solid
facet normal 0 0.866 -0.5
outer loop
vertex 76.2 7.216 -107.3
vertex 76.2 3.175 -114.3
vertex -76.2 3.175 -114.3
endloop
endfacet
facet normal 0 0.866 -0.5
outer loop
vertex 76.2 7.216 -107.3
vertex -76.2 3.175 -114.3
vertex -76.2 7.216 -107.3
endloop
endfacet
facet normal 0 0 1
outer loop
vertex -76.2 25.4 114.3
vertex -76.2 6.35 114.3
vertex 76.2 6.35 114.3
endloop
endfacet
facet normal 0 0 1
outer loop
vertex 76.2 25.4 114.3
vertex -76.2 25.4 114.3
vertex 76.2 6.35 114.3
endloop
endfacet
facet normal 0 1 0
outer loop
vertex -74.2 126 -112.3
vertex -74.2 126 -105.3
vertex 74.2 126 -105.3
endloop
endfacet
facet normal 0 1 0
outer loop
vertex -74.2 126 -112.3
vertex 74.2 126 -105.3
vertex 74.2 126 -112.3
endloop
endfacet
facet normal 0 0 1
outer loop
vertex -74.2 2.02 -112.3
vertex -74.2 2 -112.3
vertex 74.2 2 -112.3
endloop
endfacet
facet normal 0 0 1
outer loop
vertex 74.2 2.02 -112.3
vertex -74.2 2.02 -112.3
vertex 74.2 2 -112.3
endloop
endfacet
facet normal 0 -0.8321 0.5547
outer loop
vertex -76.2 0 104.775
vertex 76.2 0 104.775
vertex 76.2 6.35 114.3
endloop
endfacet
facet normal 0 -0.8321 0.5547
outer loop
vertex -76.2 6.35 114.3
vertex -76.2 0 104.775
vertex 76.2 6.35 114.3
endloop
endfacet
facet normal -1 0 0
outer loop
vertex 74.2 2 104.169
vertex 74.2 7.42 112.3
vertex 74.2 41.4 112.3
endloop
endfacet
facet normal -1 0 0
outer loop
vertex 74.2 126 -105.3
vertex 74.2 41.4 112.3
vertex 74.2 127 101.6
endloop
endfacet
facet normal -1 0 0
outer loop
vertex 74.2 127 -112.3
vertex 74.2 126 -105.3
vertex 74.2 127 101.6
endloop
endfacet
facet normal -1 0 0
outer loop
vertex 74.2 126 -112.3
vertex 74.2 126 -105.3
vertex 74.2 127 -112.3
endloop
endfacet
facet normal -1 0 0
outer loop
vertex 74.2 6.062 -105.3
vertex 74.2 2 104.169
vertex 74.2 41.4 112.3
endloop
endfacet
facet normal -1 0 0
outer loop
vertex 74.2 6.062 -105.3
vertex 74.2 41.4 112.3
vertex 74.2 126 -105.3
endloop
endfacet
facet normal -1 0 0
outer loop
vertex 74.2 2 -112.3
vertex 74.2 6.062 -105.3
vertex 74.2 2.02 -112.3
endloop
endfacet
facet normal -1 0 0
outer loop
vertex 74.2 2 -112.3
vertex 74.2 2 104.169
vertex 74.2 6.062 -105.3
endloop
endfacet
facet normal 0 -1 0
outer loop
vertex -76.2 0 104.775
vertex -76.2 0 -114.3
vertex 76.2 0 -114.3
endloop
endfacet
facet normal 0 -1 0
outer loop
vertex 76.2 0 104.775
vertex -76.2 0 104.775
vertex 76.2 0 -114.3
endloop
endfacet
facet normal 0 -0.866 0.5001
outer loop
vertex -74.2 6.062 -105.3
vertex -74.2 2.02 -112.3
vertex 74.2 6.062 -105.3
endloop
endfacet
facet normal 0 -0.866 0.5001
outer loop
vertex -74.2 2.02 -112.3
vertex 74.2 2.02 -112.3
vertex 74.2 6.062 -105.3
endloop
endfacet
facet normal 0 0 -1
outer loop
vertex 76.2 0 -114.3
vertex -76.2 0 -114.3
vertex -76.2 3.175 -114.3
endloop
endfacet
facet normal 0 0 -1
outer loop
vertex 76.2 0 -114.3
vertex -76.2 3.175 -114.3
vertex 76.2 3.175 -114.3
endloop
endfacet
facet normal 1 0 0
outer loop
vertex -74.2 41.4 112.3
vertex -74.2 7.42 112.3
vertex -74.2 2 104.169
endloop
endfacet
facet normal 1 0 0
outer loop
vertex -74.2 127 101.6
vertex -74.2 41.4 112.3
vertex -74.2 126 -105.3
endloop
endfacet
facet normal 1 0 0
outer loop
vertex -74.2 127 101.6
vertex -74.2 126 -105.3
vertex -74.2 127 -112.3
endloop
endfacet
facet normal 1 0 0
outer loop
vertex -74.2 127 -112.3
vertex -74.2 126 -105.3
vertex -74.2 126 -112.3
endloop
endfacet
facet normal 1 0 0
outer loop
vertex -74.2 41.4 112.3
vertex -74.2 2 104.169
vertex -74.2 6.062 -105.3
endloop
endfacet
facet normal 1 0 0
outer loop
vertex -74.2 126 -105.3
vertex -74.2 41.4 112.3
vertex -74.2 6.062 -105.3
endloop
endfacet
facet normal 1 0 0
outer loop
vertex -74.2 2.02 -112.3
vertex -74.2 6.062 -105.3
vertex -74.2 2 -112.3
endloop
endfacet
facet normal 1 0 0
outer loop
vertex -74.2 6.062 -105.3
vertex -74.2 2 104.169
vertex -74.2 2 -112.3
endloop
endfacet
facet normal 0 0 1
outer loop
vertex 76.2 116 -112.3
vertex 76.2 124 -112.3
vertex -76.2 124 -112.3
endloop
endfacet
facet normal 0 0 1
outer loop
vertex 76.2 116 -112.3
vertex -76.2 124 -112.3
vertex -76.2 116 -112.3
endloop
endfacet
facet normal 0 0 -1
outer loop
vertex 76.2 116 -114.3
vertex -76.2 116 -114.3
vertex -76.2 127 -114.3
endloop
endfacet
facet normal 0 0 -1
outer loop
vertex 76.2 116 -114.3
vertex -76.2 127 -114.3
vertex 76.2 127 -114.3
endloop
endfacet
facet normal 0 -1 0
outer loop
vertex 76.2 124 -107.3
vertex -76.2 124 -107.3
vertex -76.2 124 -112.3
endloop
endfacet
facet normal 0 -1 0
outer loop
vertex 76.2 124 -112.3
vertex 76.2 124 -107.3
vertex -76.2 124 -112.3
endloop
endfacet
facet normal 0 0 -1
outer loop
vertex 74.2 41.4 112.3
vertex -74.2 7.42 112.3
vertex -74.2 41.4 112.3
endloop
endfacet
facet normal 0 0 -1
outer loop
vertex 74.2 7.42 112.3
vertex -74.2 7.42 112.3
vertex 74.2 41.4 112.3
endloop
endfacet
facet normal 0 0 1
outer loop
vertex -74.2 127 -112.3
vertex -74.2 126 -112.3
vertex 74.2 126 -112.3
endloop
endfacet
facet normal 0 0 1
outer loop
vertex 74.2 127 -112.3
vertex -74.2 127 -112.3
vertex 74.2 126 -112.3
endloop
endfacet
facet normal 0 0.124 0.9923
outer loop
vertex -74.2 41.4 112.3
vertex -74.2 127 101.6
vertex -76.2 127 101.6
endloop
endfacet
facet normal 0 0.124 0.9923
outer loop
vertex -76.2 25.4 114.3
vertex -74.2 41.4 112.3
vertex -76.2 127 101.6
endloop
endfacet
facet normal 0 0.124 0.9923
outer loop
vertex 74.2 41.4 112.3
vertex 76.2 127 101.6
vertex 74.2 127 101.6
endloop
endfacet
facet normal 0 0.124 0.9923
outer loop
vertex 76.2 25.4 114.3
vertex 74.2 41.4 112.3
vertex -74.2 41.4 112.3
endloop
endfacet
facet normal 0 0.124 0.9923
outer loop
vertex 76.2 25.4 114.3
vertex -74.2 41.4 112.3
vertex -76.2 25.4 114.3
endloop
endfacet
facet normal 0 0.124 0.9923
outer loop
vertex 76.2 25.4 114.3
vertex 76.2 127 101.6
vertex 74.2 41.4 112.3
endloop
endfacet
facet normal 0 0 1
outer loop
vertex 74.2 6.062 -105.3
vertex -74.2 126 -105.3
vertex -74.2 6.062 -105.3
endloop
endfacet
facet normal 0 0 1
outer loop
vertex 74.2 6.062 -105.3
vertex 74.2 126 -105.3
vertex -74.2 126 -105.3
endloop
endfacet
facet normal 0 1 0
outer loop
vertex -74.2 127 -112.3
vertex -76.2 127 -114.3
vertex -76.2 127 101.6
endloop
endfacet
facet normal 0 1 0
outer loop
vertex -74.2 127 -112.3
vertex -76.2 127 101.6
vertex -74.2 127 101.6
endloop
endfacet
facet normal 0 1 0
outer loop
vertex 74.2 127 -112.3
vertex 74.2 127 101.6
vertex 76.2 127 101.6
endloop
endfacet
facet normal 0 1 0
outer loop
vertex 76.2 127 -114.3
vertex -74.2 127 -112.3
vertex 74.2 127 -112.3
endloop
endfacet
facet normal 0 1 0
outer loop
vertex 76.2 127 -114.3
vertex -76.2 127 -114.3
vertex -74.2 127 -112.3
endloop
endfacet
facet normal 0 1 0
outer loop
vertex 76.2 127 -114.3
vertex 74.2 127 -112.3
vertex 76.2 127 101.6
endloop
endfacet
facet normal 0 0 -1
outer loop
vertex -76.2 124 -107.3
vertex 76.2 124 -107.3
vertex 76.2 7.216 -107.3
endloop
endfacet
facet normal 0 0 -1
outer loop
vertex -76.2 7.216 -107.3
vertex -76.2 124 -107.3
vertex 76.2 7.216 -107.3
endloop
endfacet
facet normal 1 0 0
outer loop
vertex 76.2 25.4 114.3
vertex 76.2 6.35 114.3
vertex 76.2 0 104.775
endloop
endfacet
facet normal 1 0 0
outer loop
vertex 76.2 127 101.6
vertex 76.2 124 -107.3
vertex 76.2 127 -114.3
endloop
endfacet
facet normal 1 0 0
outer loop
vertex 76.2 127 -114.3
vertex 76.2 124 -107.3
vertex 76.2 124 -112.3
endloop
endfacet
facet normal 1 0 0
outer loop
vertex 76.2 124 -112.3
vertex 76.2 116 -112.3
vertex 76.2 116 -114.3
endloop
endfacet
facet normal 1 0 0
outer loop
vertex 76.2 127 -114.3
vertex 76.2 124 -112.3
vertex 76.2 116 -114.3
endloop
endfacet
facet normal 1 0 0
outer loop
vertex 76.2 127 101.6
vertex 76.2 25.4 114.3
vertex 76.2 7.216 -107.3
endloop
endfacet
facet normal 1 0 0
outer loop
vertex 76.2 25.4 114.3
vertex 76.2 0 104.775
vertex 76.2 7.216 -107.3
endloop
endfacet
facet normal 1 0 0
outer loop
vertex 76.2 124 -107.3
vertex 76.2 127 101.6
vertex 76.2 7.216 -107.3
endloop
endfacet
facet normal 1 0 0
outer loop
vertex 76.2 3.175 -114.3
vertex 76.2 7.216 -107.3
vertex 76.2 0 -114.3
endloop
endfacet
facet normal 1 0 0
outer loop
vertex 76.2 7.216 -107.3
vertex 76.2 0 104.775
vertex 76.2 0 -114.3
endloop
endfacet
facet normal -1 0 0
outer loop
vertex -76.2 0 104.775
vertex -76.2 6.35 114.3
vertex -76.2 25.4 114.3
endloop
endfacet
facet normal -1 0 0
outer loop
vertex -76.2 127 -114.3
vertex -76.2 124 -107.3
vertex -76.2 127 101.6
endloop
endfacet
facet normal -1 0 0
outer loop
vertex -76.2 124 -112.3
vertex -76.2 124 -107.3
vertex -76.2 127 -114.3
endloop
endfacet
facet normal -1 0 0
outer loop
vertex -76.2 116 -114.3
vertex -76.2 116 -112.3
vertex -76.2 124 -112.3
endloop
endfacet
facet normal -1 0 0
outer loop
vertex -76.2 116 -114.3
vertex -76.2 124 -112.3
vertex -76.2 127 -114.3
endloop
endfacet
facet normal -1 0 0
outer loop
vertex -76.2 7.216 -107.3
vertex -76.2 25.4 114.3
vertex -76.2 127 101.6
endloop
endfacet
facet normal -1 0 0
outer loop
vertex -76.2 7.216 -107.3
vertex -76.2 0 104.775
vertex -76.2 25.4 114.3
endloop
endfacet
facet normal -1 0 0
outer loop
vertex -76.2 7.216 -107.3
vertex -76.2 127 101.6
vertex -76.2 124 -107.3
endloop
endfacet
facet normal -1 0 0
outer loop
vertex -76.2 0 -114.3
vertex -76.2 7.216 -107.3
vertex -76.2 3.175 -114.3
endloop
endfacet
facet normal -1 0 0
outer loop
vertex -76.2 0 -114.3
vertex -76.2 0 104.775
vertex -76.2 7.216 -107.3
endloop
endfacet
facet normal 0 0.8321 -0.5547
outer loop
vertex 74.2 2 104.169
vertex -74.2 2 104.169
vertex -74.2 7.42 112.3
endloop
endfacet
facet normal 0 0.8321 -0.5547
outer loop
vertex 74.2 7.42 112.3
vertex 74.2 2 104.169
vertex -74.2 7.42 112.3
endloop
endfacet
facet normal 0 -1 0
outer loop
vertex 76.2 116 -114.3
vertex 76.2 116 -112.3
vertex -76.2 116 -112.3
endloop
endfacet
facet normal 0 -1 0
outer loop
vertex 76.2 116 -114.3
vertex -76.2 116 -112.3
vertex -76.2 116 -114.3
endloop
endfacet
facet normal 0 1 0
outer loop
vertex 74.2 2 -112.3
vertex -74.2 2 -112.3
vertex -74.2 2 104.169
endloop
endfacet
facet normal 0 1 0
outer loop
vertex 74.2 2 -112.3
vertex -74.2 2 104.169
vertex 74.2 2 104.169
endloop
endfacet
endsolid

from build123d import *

# Parameters (mm, degrees)
SKETCH1_W           = 152.4
SKETCH1_H           = 228.6
BOSS_EXTRUDE1_DEPTH = 127
CUT_EXTRUDE1_DEPTH  = 153.4
CUT_EXTRUDE2_DEPTH  = 153.4
SHELL1_T            = -2


with BuildPart() as part:
    # Sketch1 → Boss-Extrude1 (new body)
    with BuildSketch(Plane(origin=(0, 0, 0), x_dir=(1, 0, 0), z_dir=(0, 1, 0))):
        Rectangle(SKETCH1_W, SKETCH1_H)
    extrude(amount=BOSS_EXTRUDE1_DEPTH)

    # Sketch2 → Cut-Extrude1 (cut, through all)
    with BuildSketch(Plane(origin=(76.2, 0, 0), x_dir=(0, 0, -1), z_dir=(1, 0, 0))):
        Polygon((-101.6, 127), (-114.3, 25.4), (-114.3, 127), align=None)
        Polygon((-114.3, 6.35), (-114.3, 0), (-104.775, 0), align=None)
    extrude(amount=-CUT_EXTRUDE1_DEPTH, mode=Mode.SUBTRACT)

    # Sketch3 → Cut-Extrude2 (cut, through all)
    with BuildSketch(Plane(origin=(76.2, 0, 0), x_dir=(0, 0, -1), z_dir=(1, 0, 0))):
        Polygon((107.3, 7.216451884), (107.3, 116), (107.3, 124), (112.3, 124), (112.3, 116), (114.3, 116), (114.3, 3.175), align=None)
    extrude(amount=-CUT_EXTRUDE2_DEPTH, mode=Mode.SUBTRACT)

    # Shell1
    shell1_openings = [part.faces().sort_by_distance(p)[0] for p in [
        (0, 127, -6.35),
        (0, 76.2, 107.95),
    ]]
    offset(amount=SHELL1_T, openings=shell1_openings, kind=Kind.INTERSECTION)


solid = part.part
